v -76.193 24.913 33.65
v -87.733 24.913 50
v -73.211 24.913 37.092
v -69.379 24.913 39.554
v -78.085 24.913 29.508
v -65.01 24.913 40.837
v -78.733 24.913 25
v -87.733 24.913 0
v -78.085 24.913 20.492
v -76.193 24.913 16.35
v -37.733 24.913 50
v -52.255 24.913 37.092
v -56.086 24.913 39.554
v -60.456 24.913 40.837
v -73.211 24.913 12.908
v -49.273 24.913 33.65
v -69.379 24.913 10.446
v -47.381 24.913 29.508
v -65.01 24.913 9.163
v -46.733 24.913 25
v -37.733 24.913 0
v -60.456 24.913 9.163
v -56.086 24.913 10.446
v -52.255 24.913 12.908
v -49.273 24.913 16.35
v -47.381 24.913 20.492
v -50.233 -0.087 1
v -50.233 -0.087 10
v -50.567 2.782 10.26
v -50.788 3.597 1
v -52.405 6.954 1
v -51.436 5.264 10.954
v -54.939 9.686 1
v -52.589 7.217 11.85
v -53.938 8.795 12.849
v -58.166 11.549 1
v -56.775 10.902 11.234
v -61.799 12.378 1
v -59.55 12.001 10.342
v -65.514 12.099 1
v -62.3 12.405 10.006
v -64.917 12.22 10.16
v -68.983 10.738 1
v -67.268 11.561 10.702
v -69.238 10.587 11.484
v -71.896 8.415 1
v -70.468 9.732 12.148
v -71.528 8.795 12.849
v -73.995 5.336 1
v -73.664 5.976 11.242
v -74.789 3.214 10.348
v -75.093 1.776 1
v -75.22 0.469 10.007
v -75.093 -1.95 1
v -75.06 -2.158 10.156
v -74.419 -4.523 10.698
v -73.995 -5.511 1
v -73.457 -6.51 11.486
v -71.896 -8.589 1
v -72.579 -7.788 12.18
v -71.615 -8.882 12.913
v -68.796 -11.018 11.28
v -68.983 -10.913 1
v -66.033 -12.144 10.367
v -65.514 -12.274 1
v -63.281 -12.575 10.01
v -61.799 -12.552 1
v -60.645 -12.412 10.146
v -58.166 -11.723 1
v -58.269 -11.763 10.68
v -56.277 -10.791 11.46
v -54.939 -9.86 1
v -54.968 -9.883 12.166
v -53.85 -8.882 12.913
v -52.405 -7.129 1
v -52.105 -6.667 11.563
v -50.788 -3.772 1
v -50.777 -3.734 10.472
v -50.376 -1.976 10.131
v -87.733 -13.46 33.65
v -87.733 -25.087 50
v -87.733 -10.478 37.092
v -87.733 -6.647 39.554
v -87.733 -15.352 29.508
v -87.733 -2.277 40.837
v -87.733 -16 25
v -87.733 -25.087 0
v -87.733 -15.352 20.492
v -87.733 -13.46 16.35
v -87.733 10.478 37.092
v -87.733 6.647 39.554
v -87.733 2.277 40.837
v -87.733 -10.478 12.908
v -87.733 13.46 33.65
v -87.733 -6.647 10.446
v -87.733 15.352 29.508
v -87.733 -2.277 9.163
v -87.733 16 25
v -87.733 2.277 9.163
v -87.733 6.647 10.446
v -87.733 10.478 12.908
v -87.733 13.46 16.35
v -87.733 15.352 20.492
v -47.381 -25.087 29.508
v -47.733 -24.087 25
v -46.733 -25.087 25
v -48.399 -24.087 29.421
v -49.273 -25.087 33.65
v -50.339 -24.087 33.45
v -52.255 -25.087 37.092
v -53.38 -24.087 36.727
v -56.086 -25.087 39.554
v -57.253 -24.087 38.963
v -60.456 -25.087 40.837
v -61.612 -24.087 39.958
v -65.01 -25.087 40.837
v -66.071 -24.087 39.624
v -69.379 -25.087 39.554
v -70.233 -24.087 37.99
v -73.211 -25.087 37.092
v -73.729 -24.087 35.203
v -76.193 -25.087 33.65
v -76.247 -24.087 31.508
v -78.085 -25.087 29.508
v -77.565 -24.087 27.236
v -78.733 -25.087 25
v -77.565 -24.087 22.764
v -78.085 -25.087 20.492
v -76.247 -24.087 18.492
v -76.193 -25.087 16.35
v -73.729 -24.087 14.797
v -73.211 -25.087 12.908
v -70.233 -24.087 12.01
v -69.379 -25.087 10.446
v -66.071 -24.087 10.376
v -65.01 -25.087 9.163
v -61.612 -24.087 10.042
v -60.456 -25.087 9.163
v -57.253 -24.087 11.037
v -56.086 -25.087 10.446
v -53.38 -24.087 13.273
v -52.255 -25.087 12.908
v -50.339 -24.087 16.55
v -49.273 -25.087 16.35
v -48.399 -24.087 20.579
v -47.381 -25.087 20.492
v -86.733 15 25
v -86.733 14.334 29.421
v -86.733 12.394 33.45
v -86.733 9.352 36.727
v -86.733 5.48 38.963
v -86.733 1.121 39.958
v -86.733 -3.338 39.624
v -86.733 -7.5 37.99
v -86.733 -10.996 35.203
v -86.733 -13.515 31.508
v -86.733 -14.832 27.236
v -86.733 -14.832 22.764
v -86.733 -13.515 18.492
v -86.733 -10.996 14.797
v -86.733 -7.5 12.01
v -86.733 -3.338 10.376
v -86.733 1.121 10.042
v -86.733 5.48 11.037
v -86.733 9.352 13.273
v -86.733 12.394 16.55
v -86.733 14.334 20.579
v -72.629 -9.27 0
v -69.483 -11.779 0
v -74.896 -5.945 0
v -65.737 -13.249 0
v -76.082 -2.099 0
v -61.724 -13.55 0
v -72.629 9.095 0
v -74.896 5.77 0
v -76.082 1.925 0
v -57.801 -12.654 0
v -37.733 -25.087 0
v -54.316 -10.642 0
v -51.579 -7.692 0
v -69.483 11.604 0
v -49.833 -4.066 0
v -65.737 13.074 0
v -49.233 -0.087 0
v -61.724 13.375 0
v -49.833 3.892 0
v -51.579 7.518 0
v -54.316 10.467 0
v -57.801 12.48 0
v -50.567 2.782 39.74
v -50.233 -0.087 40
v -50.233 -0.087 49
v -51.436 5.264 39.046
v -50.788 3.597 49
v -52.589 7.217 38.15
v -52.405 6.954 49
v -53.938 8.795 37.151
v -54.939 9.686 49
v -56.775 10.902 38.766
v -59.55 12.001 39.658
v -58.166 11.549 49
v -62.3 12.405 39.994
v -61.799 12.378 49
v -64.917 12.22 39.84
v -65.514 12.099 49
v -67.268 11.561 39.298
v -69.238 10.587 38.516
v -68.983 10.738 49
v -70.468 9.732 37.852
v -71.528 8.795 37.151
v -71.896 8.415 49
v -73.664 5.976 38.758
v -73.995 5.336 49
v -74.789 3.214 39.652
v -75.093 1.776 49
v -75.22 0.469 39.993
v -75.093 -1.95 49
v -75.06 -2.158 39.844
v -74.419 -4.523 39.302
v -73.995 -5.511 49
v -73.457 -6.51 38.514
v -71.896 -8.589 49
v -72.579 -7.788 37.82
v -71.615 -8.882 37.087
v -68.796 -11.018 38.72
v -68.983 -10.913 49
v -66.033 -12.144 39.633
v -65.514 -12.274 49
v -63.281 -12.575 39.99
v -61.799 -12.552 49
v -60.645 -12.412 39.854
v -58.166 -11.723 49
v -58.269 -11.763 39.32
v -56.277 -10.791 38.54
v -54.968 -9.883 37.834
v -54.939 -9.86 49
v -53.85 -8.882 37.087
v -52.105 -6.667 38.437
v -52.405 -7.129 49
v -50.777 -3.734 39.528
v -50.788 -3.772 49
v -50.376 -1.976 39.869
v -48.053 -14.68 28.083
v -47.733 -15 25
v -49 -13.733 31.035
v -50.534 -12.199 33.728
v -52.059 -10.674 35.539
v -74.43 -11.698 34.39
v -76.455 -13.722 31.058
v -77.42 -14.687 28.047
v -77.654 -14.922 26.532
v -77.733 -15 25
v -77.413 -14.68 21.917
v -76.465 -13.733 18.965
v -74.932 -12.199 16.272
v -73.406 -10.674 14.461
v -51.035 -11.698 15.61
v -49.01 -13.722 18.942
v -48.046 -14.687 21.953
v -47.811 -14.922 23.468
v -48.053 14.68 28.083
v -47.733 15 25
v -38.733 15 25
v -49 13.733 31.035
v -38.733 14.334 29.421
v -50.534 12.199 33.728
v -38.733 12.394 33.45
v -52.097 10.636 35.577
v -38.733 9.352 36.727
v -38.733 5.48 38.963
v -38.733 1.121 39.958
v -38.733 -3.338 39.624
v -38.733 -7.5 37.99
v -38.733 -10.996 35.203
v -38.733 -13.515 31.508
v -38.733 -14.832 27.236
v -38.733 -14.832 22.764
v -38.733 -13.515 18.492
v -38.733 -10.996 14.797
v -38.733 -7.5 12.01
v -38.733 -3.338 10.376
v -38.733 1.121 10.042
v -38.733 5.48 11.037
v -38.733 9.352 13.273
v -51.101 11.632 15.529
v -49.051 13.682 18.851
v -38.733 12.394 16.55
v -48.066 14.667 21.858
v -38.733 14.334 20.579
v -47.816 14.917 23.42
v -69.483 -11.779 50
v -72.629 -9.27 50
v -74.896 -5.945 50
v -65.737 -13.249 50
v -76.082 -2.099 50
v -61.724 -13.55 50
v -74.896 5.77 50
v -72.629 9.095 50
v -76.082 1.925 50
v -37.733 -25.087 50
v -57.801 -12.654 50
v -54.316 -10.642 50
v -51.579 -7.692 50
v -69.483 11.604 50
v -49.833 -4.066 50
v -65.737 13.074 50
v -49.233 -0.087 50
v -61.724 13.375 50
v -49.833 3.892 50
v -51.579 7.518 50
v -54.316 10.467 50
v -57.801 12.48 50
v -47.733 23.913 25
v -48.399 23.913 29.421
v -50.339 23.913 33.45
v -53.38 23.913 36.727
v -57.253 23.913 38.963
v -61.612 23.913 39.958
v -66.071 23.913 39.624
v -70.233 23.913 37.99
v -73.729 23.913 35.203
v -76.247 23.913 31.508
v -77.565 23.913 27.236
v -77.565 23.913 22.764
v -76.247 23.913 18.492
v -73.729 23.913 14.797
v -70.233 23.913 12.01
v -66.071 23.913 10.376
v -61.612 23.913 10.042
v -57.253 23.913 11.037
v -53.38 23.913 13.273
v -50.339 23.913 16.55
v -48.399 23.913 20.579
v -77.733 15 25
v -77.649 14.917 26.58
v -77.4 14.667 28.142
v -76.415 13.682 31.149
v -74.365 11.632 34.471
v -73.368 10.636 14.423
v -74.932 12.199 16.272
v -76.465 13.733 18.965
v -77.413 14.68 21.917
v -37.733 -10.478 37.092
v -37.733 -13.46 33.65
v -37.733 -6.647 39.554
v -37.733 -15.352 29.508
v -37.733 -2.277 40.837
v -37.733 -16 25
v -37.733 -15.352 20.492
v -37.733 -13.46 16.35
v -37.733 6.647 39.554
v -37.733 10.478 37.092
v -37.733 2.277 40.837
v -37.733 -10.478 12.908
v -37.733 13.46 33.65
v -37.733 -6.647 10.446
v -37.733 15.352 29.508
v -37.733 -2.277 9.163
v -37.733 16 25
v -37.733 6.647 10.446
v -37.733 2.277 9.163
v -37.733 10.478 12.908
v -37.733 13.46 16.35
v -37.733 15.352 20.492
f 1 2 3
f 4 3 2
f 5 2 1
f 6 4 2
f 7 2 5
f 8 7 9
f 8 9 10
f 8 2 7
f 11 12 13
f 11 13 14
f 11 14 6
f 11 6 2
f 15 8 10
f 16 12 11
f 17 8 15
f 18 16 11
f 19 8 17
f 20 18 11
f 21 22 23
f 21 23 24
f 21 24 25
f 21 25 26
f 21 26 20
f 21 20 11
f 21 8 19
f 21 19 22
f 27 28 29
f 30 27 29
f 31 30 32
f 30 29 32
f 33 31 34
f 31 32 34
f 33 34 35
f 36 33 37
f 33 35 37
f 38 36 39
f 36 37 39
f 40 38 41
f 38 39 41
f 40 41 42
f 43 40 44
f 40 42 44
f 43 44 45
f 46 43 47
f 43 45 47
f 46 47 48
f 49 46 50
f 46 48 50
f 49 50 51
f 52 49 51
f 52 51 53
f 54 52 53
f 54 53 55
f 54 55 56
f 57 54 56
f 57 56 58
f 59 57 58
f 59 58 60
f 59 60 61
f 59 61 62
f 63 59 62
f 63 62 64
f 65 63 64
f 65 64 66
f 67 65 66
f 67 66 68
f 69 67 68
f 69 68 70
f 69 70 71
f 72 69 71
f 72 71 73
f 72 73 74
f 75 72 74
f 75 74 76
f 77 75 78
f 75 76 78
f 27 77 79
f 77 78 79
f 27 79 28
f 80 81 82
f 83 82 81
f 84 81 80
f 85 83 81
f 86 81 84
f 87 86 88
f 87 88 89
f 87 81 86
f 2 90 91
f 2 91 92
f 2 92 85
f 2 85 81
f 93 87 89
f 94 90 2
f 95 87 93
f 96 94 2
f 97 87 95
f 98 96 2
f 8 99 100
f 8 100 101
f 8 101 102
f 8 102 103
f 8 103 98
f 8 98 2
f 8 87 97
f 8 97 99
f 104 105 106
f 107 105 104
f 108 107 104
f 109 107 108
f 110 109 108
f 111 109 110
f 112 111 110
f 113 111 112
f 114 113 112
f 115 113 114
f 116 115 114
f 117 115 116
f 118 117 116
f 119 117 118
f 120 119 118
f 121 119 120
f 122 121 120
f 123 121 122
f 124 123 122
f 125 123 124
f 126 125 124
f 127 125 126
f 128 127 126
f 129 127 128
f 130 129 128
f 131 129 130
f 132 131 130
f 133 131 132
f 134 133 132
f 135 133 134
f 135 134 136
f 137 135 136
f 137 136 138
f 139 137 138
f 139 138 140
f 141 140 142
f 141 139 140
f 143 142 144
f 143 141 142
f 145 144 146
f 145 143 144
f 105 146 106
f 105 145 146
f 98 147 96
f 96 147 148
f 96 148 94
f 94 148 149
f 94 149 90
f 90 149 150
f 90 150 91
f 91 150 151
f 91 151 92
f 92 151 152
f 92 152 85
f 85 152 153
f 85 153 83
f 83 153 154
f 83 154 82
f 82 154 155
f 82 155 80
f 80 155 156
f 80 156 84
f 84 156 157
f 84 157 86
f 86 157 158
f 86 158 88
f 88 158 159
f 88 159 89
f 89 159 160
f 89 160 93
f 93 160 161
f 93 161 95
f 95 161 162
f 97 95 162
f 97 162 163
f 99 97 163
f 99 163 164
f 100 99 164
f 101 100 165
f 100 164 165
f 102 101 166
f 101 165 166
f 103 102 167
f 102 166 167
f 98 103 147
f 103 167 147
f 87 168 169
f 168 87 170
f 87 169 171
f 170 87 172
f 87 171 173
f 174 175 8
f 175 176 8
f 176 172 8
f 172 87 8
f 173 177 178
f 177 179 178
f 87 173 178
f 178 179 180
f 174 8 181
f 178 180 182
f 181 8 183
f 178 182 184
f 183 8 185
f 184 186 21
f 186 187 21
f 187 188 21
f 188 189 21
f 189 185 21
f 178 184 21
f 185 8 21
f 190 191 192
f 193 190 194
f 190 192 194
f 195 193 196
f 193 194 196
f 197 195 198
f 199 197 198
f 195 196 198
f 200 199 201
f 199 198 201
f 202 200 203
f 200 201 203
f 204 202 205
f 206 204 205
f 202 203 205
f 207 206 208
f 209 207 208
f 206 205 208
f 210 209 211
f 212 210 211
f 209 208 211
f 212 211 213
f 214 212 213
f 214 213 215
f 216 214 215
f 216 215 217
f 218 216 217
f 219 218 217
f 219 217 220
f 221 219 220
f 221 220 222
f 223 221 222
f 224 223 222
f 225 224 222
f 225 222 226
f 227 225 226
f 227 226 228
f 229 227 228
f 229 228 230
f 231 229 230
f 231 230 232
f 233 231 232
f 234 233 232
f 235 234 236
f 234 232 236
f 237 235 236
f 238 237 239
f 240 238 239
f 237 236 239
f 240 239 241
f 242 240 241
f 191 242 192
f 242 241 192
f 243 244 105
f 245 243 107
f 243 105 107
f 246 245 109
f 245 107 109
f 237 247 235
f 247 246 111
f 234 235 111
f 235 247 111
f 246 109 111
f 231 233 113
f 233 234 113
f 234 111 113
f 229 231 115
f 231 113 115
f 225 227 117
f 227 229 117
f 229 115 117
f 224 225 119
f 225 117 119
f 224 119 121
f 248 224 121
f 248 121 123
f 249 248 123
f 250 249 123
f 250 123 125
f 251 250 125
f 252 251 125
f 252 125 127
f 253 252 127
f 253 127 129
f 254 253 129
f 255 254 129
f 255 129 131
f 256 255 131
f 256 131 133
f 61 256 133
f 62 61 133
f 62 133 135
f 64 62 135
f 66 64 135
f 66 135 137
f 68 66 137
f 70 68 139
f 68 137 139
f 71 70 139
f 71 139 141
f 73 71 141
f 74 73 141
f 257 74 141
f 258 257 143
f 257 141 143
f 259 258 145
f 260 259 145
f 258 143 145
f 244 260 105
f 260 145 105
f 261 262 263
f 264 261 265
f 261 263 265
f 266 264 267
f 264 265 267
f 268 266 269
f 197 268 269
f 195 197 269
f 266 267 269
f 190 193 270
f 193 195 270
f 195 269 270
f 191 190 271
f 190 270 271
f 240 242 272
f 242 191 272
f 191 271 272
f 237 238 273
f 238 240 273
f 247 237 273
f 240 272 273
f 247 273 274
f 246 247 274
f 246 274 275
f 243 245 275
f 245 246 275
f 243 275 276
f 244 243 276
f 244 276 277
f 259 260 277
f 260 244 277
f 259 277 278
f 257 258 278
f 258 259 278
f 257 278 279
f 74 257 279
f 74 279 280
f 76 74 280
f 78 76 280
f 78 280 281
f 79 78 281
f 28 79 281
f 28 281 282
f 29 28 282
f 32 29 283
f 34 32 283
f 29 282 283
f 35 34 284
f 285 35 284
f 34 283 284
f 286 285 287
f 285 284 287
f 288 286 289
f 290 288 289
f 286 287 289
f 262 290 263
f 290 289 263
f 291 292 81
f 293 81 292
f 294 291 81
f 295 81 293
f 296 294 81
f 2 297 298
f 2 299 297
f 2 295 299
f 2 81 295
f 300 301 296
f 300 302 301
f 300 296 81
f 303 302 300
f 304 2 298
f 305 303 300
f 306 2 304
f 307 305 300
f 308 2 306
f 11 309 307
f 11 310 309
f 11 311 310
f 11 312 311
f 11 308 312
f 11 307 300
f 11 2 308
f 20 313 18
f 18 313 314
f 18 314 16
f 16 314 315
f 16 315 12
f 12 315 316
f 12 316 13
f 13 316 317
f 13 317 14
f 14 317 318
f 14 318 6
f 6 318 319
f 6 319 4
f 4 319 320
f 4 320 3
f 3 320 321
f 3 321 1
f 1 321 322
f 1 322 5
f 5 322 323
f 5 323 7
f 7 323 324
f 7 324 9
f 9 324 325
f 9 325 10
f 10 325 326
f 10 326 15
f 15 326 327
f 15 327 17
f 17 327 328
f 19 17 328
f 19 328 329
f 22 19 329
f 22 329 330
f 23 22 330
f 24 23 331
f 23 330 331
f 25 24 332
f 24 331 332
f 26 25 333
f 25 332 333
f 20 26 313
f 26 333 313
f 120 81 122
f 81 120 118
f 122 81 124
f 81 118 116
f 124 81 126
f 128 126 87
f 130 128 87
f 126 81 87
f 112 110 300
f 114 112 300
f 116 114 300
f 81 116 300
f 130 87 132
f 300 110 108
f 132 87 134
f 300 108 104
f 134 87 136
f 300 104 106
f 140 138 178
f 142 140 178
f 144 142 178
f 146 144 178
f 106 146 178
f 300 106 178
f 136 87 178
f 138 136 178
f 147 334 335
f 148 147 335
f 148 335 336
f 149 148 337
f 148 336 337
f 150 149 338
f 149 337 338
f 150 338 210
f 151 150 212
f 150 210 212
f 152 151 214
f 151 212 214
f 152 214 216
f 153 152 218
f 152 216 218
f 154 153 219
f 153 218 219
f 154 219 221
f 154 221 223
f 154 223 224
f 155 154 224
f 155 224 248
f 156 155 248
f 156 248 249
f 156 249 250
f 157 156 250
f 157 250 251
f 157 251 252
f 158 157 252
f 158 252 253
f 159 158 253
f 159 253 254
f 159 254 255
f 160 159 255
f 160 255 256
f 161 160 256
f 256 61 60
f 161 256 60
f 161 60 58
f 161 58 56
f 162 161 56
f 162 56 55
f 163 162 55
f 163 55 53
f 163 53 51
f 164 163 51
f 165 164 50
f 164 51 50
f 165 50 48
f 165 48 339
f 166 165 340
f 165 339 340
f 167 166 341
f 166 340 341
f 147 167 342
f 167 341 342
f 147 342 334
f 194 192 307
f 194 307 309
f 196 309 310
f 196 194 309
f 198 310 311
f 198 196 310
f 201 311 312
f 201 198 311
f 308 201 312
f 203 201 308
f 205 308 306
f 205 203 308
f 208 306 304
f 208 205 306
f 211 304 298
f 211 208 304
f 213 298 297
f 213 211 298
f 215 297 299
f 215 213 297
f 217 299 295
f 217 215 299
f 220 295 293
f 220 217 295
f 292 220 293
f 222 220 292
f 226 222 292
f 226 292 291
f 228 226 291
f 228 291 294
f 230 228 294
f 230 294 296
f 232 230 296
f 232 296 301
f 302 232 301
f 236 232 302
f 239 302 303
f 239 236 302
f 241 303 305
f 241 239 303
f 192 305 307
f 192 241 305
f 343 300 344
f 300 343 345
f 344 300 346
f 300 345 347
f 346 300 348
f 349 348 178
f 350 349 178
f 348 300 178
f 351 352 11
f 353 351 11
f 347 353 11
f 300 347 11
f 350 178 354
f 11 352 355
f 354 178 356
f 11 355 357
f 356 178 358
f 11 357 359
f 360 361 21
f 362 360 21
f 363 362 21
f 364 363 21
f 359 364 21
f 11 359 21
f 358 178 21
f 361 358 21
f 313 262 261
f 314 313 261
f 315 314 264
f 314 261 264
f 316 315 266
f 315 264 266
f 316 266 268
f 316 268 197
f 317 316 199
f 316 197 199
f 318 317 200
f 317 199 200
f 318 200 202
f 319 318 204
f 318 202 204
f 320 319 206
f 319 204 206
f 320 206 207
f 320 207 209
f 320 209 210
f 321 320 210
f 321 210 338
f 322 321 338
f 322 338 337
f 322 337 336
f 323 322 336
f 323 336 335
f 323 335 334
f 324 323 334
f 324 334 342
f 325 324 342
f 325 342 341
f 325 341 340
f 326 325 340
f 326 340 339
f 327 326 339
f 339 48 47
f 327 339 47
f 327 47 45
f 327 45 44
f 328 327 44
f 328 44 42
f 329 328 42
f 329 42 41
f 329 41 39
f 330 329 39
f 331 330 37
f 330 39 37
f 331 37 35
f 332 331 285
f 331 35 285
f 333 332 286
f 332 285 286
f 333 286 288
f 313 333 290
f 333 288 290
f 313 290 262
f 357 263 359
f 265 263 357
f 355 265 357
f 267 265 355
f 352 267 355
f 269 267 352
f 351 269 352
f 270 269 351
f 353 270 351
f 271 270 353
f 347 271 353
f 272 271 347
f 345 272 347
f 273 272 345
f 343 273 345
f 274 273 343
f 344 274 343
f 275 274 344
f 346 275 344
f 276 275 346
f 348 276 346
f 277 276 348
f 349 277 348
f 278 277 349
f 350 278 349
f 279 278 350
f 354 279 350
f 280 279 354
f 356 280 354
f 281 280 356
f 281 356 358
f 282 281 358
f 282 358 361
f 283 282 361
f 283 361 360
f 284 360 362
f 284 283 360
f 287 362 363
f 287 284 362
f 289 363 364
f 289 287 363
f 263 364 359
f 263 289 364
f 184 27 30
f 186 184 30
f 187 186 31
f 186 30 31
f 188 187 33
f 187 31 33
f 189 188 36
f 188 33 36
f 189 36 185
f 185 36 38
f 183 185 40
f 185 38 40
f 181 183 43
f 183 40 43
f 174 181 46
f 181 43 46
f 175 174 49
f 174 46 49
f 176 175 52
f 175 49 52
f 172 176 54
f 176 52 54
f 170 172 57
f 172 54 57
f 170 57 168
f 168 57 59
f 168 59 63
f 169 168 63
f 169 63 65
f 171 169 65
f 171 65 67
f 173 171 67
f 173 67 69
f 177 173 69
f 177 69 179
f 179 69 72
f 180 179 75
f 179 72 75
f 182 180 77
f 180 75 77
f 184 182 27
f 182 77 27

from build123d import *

# Parameters (mm, degrees)
F0_W     = 50
F0_H     = 50
F1_DEPTH = 50
F2_R     = 15
F3_DEPTH = 50.001
F4_R     = 15
F5_DEPTH = 50.001
F6_R     = 12.5
F7_DEPTH = 50.001
F8_SIZE  = 1


with BuildPart() as f1:
    # F0 (on Top) → F1 (new body)
    with BuildSketch(Plane.XY):
        with Locations((-62.7328101546, -0.0872552718)):
            Rectangle(F0_W, F0_H)
    extrude(amount=F1_DEPTH)

    # F2 (on face) → F3 (cut, through all)
    with BuildSketch(Plane.XZ.offset(25.0872552718)):
        with Locations((-62.7328101546, 25)):
            Circle(F2_R)
    extrude(amount=-F3_DEPTH, mode=Mode.SUBTRACT)

    # F4 (on face) → F5 (cut, through all)
    with BuildSketch(Plane.YZ.offset(-37.7328101546)):
        with Locations((0, 25)):
            Circle(F4_R)
    extrude(amount=-F5_DEPTH, mode=Mode.SUBTRACT)

    # F6 (on face) → F7 (cut, through all)
    with BuildSketch(Plane.XY.offset(50)):
        with Locations((-62.7328101546, -0.0872552718)):
            Circle(F6_R)
    extrude(amount=-F7_DEPTH, mode=Mode.SUBTRACT)

    # F8
    f8_edges = [f1.edges().sort_by_distance(p)[0] for p in [
        (-77.73281, -25.087255, 25),
        (-37.73281, -15, 25),
        (-75.23281, -0.087255, 50),
        (-77.73281, 24.912745, 25),
        (-75.23281, -0.087255, 0),
        (-87.73281, -15, 25),
    ]]
    chamfer(f8_edges, length=F8_SIZE)


solid = f1.part
